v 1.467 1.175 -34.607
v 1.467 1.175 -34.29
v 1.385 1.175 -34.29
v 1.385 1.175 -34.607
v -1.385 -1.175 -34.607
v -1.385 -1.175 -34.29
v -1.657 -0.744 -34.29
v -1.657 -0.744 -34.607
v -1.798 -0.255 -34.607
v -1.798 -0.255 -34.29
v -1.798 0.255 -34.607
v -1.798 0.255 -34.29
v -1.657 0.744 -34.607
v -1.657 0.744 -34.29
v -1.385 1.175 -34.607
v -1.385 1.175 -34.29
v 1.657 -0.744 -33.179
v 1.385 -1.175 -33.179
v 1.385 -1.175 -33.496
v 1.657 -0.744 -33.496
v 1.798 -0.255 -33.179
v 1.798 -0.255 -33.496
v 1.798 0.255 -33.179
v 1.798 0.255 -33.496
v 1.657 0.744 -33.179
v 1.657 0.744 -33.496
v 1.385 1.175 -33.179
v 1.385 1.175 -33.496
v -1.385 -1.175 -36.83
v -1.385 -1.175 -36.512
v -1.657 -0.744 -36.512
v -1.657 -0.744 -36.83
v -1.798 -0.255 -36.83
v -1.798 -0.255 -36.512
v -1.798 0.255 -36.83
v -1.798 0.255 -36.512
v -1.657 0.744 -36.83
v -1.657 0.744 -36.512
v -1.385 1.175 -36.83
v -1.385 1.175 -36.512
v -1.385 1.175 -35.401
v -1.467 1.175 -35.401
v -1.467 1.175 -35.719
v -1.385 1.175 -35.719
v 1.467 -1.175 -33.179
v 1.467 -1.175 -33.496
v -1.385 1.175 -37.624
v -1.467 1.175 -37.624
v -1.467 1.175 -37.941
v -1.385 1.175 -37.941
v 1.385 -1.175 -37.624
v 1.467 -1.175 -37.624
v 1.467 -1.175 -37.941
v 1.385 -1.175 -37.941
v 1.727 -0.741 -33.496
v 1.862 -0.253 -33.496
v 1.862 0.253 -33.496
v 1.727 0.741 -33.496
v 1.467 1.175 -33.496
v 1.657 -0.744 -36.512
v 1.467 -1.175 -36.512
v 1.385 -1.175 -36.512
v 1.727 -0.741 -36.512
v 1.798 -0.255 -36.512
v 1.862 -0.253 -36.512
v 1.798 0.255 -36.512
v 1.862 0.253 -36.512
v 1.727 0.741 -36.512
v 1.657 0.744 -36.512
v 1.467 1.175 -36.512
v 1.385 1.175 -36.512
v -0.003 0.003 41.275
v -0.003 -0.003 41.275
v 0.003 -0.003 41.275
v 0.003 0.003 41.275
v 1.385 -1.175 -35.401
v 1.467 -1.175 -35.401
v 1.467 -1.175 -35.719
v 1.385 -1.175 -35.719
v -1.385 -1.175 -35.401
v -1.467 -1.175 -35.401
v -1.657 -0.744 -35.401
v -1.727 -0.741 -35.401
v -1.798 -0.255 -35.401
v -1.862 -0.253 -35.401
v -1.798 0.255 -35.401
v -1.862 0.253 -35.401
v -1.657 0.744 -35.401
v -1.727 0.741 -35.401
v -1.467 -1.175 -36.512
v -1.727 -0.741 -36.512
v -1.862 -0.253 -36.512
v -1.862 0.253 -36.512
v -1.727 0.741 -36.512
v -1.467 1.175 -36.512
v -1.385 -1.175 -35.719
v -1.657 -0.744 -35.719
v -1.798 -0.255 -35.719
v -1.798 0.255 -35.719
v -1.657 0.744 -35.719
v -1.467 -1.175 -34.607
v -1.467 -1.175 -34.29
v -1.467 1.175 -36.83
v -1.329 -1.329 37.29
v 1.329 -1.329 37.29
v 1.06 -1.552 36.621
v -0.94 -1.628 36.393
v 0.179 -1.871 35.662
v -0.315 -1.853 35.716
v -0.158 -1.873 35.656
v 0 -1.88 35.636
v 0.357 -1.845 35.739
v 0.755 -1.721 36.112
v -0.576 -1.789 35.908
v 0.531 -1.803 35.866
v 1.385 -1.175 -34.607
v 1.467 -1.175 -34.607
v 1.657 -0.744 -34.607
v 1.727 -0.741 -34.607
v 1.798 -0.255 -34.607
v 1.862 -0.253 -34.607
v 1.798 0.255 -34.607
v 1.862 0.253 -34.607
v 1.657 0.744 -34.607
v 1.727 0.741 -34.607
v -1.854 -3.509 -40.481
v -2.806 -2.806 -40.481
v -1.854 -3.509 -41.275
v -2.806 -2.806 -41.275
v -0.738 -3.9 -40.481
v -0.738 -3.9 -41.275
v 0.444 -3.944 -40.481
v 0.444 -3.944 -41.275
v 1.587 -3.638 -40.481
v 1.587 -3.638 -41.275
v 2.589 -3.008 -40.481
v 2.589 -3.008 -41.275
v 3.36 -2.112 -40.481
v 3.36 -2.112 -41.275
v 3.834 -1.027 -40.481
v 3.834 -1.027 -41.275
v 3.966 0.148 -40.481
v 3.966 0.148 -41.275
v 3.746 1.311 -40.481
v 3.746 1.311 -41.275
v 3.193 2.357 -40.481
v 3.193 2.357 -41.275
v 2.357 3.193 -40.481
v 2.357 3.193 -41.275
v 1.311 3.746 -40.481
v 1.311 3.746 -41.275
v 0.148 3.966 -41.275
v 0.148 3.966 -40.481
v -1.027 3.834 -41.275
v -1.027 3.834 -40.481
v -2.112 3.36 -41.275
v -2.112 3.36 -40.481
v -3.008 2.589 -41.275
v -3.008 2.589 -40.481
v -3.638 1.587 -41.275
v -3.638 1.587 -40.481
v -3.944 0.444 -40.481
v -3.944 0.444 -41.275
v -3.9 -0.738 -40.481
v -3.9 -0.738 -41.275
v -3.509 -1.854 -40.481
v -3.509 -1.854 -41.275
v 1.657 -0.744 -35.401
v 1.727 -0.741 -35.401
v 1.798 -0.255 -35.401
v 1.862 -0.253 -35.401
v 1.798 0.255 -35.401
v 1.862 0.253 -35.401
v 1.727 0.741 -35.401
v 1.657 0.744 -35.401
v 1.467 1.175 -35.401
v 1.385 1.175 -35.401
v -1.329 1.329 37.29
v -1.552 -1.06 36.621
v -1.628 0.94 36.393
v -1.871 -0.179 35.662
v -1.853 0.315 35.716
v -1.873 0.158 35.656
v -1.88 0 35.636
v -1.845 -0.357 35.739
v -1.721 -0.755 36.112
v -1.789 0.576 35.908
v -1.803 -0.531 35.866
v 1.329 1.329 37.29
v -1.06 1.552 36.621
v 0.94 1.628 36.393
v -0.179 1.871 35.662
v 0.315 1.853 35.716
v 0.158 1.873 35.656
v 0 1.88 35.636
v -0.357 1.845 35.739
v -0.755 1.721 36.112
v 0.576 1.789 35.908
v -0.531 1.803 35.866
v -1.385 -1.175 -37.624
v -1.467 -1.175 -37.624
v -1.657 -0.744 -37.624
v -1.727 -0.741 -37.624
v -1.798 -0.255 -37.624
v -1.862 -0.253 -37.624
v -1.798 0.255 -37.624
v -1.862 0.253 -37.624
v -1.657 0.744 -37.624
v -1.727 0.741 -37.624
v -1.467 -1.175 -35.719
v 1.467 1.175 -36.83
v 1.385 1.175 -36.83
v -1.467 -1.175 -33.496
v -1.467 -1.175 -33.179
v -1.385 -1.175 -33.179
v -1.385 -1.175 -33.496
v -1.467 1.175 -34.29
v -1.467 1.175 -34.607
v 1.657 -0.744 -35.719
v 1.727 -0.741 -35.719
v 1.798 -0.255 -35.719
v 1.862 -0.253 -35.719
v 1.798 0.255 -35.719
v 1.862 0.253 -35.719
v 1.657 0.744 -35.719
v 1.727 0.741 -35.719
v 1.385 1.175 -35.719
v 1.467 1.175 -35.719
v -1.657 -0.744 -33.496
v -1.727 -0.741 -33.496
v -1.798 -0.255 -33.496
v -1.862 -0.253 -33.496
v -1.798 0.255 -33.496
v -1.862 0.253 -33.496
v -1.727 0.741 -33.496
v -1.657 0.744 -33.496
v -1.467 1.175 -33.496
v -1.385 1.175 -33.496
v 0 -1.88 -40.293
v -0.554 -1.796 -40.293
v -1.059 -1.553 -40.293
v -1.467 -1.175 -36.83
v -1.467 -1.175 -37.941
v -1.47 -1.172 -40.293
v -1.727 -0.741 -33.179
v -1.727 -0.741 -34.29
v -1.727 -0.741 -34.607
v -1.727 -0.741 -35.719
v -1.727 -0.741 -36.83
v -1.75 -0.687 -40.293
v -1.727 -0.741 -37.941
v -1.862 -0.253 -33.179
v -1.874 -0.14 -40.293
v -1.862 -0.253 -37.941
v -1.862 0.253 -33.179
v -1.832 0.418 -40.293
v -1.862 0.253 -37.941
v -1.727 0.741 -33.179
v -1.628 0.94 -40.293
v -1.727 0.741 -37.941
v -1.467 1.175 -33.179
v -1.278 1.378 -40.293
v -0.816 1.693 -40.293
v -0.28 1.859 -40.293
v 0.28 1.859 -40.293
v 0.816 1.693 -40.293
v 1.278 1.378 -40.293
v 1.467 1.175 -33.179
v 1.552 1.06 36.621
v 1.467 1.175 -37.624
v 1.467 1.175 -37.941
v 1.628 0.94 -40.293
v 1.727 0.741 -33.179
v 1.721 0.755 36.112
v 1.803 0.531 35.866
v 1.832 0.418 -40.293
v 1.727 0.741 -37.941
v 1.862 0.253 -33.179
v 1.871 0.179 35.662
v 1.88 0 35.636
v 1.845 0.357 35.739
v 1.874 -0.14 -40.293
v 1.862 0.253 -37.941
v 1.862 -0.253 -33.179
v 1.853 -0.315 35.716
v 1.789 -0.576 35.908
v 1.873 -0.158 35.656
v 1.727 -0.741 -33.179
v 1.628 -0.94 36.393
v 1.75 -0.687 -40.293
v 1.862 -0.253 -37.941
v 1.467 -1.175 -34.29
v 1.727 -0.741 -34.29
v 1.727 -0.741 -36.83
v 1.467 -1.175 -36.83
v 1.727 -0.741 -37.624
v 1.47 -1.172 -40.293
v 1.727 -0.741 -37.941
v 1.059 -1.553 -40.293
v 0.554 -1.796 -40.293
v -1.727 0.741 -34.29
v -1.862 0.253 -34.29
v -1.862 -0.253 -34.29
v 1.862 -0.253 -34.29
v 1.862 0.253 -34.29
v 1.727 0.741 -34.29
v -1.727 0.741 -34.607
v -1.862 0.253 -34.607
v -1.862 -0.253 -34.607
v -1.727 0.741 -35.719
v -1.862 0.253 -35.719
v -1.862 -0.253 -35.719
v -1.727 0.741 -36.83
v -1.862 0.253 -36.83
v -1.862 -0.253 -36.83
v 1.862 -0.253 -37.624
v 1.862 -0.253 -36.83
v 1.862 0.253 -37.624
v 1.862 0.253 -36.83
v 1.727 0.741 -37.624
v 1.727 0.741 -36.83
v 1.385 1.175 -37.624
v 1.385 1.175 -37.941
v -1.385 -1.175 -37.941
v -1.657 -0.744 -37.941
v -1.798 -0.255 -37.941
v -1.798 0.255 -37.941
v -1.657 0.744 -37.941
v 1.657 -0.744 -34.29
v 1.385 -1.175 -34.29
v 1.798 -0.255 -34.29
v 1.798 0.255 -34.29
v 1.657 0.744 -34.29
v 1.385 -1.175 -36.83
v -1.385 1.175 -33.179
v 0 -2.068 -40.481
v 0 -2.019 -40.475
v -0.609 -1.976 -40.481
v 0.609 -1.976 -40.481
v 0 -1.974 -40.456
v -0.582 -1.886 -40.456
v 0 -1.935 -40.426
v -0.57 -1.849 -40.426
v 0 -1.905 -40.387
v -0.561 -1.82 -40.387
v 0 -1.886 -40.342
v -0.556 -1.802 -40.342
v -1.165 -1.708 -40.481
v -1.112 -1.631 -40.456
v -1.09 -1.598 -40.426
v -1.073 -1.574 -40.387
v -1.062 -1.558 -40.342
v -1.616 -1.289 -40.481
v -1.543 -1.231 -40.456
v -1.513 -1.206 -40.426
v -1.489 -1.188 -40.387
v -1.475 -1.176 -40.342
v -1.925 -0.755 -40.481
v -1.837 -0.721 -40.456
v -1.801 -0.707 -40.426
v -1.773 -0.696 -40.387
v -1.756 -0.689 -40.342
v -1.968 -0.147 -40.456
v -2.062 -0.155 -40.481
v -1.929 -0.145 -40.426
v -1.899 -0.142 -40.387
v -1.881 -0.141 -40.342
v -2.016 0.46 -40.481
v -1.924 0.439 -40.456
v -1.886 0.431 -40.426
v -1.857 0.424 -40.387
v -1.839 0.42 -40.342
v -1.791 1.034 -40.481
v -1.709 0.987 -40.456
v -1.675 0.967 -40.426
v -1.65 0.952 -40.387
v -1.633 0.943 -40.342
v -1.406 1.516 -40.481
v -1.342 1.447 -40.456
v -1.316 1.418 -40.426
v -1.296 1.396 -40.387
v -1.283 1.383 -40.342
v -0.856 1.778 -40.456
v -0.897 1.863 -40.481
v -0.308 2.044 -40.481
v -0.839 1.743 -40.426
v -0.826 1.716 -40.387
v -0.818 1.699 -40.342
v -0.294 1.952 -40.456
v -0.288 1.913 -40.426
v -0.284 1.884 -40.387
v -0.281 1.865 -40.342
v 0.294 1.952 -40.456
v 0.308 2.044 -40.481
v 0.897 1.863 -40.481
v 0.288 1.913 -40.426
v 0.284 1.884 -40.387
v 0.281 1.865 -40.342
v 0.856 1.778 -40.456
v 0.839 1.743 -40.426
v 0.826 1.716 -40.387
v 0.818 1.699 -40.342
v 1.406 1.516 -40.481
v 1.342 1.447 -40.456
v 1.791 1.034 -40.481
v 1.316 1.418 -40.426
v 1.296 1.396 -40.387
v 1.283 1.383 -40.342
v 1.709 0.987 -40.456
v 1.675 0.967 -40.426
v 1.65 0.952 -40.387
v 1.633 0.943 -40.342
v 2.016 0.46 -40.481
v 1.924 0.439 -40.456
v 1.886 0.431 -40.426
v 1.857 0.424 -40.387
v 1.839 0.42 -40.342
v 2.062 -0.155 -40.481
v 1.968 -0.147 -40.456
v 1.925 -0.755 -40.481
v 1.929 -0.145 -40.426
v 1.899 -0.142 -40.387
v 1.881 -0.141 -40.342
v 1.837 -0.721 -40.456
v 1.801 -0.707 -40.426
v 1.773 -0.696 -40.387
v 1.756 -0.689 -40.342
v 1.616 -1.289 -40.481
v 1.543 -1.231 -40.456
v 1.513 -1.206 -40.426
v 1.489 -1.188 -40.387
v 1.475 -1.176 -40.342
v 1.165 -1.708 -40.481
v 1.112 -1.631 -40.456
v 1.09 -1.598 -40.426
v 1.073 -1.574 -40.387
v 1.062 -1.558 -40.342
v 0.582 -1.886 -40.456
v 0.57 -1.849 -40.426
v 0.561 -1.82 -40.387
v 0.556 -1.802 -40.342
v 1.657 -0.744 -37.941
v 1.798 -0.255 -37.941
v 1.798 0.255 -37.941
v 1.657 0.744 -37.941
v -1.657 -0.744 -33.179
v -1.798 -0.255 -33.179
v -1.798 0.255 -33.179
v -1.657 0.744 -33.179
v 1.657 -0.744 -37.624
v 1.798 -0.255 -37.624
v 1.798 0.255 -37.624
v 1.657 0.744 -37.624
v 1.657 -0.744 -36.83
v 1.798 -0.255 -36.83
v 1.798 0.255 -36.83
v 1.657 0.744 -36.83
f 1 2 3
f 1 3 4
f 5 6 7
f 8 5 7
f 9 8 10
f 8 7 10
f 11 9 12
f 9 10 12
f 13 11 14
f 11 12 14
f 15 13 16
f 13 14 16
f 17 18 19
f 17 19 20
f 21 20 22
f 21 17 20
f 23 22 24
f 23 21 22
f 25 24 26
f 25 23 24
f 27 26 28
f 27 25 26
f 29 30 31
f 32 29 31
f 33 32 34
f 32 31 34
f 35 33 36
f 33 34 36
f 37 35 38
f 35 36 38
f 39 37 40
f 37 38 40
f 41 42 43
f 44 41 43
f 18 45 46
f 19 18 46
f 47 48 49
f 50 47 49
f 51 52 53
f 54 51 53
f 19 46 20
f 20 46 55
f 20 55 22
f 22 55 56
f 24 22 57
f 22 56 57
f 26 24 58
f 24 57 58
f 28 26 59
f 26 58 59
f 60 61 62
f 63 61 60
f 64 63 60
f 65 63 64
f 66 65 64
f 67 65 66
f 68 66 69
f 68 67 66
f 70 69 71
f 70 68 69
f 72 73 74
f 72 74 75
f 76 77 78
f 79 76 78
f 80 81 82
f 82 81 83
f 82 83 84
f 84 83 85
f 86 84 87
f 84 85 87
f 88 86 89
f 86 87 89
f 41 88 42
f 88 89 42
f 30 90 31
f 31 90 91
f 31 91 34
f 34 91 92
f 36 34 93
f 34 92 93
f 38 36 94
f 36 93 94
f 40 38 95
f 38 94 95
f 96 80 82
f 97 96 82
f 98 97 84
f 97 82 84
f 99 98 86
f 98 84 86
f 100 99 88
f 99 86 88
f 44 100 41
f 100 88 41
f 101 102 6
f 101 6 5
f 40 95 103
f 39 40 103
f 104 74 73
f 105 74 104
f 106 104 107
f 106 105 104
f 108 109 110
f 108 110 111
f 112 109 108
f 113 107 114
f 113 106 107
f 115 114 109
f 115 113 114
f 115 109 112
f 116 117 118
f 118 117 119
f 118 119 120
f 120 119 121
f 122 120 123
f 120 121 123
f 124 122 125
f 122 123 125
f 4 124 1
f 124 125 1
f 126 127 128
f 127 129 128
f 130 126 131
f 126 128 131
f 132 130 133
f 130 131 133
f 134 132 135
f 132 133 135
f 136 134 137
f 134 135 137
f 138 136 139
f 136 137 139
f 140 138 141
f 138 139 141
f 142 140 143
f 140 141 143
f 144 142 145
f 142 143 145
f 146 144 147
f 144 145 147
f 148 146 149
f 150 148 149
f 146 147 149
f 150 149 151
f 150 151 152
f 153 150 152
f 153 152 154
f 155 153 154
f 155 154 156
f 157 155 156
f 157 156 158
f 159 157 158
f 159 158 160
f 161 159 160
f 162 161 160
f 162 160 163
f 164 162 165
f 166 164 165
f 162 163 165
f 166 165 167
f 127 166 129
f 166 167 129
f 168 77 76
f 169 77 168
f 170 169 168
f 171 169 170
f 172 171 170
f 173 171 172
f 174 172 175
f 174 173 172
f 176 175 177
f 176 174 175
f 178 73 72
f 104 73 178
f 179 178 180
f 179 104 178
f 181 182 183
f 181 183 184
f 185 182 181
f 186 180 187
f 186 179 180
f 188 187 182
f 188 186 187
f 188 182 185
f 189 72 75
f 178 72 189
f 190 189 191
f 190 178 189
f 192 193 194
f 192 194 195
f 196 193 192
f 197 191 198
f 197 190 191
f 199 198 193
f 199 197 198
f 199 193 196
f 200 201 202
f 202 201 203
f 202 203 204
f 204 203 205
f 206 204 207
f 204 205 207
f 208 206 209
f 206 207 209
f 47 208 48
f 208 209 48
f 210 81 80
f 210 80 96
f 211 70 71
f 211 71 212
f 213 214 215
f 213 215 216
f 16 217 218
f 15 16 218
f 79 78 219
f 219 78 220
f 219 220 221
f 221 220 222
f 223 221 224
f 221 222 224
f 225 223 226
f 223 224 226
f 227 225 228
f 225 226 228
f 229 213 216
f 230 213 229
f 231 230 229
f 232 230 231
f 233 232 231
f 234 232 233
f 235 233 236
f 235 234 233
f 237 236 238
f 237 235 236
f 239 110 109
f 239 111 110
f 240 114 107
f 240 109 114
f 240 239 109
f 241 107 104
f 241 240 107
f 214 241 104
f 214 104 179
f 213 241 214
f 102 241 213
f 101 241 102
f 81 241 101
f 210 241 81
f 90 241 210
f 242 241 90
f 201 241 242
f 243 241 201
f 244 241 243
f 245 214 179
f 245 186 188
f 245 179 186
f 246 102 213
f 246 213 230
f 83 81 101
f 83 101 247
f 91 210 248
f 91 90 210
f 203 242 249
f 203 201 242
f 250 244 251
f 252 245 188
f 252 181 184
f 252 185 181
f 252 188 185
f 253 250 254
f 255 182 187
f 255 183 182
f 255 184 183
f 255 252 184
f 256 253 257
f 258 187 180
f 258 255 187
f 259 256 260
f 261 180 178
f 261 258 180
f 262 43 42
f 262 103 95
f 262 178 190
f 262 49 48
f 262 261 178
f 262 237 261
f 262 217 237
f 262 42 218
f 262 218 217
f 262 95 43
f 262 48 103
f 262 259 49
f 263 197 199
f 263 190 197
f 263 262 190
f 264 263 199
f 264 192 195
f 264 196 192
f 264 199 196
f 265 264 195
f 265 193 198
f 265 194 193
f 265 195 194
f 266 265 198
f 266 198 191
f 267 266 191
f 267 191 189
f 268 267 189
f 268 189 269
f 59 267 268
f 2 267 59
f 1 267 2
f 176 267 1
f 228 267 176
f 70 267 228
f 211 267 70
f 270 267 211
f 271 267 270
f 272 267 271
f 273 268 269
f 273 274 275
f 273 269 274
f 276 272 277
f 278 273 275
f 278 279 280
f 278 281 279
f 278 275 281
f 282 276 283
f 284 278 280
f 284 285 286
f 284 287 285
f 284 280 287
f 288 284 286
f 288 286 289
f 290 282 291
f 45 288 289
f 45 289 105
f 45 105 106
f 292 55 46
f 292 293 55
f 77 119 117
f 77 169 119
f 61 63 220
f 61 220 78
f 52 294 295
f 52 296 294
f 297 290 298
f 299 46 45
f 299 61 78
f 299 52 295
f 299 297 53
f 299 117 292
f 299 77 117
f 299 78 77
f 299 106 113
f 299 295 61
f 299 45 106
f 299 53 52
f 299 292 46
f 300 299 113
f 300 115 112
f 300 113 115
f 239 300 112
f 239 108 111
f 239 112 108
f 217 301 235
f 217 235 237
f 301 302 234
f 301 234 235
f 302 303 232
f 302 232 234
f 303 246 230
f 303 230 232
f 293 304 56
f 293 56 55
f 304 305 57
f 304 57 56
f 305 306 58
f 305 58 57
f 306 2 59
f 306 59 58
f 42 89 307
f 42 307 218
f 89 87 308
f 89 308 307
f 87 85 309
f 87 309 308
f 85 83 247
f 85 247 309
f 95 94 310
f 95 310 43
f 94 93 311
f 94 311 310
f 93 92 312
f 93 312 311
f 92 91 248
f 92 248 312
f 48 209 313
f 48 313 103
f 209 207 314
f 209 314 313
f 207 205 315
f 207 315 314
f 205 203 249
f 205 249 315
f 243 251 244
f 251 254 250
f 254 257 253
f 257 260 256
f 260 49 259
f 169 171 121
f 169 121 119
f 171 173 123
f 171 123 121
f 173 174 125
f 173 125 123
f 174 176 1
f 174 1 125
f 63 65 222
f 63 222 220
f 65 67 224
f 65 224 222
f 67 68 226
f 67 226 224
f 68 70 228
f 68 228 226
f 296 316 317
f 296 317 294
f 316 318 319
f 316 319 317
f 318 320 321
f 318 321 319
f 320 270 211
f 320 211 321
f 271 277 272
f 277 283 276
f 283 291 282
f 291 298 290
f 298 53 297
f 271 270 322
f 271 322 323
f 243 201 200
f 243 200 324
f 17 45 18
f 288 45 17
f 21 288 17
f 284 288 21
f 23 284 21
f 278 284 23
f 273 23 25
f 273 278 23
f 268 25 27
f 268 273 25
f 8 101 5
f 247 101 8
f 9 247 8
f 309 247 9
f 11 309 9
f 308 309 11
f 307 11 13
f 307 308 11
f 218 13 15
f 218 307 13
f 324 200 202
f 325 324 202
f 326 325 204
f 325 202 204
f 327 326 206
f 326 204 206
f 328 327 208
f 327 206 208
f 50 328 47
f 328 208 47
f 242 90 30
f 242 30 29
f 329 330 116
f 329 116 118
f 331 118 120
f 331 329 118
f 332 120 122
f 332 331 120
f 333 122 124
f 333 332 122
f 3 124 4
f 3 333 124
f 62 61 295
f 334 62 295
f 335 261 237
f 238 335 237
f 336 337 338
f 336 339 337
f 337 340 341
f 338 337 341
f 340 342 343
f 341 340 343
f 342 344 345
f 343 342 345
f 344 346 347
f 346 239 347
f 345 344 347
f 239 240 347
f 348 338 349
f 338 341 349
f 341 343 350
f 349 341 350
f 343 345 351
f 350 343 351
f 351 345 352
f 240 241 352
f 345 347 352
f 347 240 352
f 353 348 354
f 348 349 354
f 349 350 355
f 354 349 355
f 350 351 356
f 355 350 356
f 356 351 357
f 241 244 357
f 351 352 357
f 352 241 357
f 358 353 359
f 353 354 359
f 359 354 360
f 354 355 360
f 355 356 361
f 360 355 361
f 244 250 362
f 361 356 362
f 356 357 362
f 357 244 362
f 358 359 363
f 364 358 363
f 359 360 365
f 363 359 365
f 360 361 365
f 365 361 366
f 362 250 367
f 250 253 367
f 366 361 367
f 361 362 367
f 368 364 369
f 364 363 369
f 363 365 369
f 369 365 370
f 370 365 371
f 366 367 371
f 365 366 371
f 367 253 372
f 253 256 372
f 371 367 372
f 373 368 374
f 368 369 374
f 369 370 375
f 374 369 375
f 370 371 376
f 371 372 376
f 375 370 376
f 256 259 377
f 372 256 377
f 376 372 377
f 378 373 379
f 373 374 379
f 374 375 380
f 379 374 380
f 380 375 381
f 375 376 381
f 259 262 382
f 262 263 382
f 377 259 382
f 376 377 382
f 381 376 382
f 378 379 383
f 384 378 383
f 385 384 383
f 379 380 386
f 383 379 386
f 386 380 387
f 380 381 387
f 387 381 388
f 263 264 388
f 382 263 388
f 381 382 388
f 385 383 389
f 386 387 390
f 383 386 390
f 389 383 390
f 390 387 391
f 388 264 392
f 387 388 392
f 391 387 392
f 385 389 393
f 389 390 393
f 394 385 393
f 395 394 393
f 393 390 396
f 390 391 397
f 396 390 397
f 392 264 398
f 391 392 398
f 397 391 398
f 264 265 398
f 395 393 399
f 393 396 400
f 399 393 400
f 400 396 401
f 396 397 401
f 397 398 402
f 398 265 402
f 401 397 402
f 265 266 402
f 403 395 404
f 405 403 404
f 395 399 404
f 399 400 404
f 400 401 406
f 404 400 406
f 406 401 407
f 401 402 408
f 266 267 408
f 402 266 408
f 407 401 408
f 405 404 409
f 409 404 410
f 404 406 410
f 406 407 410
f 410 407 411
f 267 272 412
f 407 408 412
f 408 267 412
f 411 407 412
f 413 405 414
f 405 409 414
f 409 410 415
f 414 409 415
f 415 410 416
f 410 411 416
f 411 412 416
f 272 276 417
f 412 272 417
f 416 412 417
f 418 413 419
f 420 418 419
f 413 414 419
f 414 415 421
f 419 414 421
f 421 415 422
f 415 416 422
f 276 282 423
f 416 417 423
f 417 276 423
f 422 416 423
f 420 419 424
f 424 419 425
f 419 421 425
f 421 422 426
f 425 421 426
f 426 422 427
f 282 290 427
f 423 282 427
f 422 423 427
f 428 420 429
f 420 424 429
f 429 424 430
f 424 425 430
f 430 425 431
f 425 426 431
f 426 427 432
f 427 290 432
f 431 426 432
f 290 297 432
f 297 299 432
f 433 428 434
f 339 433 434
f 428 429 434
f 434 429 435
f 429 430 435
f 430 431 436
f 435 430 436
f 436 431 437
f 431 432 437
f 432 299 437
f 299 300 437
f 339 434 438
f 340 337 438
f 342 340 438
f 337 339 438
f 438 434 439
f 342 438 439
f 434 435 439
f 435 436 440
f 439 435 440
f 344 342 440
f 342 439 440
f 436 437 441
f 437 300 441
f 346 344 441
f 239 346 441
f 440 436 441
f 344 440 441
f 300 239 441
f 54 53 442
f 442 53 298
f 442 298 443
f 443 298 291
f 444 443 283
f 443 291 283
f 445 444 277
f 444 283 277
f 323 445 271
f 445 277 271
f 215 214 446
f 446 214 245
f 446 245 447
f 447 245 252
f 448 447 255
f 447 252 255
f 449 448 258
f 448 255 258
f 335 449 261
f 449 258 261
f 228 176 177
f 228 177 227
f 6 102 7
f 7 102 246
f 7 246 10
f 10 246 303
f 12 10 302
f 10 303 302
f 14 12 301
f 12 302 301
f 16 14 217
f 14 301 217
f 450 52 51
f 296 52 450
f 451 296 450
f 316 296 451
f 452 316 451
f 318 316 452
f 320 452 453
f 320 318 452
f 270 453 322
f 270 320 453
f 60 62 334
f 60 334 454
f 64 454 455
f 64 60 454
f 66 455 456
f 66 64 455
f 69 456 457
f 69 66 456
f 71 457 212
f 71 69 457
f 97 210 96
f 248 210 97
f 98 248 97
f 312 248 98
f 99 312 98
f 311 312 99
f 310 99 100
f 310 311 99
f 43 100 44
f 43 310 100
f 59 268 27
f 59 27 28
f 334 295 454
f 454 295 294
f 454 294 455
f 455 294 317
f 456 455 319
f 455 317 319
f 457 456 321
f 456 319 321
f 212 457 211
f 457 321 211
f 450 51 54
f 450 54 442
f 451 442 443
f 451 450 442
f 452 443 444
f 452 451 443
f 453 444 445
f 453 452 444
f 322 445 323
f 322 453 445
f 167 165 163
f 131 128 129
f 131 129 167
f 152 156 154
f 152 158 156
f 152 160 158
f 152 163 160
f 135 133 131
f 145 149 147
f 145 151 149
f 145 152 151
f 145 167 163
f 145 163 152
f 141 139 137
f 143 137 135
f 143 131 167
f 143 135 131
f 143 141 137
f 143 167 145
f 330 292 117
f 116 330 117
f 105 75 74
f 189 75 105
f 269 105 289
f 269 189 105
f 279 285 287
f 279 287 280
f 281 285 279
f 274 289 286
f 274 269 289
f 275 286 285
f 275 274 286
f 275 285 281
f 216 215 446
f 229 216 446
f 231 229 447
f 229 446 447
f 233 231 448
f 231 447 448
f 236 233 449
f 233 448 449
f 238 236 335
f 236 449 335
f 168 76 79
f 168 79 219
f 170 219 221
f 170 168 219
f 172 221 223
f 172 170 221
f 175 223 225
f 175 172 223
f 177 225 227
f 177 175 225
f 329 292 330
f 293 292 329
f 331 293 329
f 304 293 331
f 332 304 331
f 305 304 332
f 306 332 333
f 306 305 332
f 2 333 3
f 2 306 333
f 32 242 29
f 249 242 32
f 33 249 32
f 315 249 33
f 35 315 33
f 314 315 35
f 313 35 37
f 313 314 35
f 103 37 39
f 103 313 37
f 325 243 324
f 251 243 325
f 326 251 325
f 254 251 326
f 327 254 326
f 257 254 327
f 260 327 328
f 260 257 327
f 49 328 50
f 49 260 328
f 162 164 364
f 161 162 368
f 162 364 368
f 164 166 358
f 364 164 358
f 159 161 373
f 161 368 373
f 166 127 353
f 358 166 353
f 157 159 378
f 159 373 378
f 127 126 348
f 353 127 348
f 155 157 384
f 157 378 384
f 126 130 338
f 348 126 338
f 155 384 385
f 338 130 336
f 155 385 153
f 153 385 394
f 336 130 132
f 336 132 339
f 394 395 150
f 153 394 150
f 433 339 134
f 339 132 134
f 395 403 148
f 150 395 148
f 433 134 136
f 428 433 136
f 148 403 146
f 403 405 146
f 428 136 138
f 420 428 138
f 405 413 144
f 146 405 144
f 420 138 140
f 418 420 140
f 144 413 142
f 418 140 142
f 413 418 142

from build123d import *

# Parameters (mm, degrees)
CUT_EXTRUDE1_DEPTH      = 42.360505525
CIRPATTERN1_COUNT       = 4
SKETCH5_W               = 0.79375
SKETCH5_H               = 3.96875
FILLET1_R               = 0.18796
CUT_EXTRUDE3_REACH      = 43.876
CUT_EXTRUDE3_END_RADIUS = 1.8161
SKETCH6_W               = 0.3175
SKETCH6_H               = 2.3495


with BuildPart() as part:
    # Sketch2 → Revolve1 (revolve)
    with BuildSketch(Plane(origin=(0, 0, 0), x_dir=(0, 0, -1), z_dir=(1, 0, 0))):
        Polygon((-35.6362, -1.8796), (41.275, -1.8796), (41.275, 0), (-41.275, 0), (-41.275, -1.8796), align=None)
    revolve(axis=Axis((0, 0, 41.275), (0, 0, -1)))

    # Sketch3 → Cut-Extrude1 (cut, symmetric)
    with BuildSketch(Plane(origin=(0, 0, 0), x_dir=(0, 0, -1), z_dir=(1, 0, 0))):
        Polygon((-41.275, -0.00254), (-35.6362, -1.8796), (-41.275, -1.8796), align=None)
    cut_extrude1 = extrude(amount=CUT_EXTRUDE1_DEPTH, both=True, mode=Mode.SUBTRACT)

    # CirPattern1: Cut-Extrude1 ×4 about axis
    cirpattern1_axis = Axis((0, 0, 0), (0, 0, 1))
    for i in range(1, CIRPATTERN1_COUNT):
        add(cut_extrude1.rotate(cirpattern1_axis, i * 360 / CIRPATTERN1_COUNT), mode=Mode.SUBTRACT)

    # Sketch5 → Revolve2 (revolve)
    with BuildSketch(Plane(origin=(0, 0, 0), x_dir=(0, 0, -1), z_dir=(1, 0, 0)), mode=Mode.PRIVATE) as revolve2_sk:
        with Locations((40.878125, 1.984375)):
            Rectangle(SKETCH5_W, SKETCH5_H)
    revolve(revolve2_sk.sketch.rotate(Axis((0, 0, -41.275), (0, 0, 1)), 135), axis=Axis((0, 0, -41.275), (0, 0, 1)))

    # Fillet1
    fillet1_edges = [part.edges().sort_by_distance(p)[0] for p in [
        (0, 1.8796, -40.48125),
    ]]
    fillet(fillet1_edges, radius=FILLET1_R)

    # Cut-Extrude3: up to this cylinder (the profile starts outside it)
    cut_extrude3_end = Plane(origin=(0, 0, -35.56), z_dir=(0, 0, 1)) * Cylinder(CUT_EXTRUDE3_END_RADIUS, 96.8292, mode=Mode.PRIVATE)
    # Sketch6 → Cut-Extrude3 (cut, up to the surface)
    with BuildSketch(Plane(origin=(1.8796, 0, 0), x_dir=(0, 0, -1), z_dir=(1, 0, 0)), mode=Mode.PRIVATE) as cut_extrude3_sk1:
        with Locations((33.3375, 0)):
            Rectangle(SKETCH6_W, SKETCH6_H)
    cut_extrude3_tool1 = extrude(cut_extrude3_sk1.sketch, amount=-CUT_EXTRUDE3_REACH, mode=Mode.PRIVATE) - cut_extrude3_end
    # Sketch6 → Cut-Extrude3 (cut, up to the surface)
    with BuildSketch(Plane(origin=(1.8796, 0, 0), x_dir=(0, 0, -1), z_dir=(1, 0, 0)), mode=Mode.PRIVATE) as cut_extrude3_sk2:
        with Locations((34.44875, 0)):
            Rectangle(SKETCH6_W, SKETCH6_H)
    cut_extrude3_tool2 = extrude(cut_extrude3_sk2.sketch, amount=-CUT_EXTRUDE3_REACH, mode=Mode.PRIVATE) - cut_extrude3_end
    # Sketch6 → Cut-Extrude3 (cut, up to the surface)
    with BuildSketch(Plane(origin=(1.8796, 0, 0), x_dir=(0, 0, -1), z_dir=(1, 0, 0)), mode=Mode.PRIVATE) as cut_extrude3_sk3:
        with Locations((35.56, 0)):
            Rectangle(SKETCH6_W, SKETCH6_H)
    cut_extrude3_tool3 = extrude(cut_extrude3_sk3.sketch, amount=-CUT_EXTRUDE3_REACH, mode=Mode.PRIVATE) - cut_extrude3_end
    # Sketch6 → Cut-Extrude3 (cut, up to the surface)
    with BuildSketch(Plane(origin=(1.8796, 0, 0), x_dir=(0, 0, -1), z_dir=(1, 0, 0)), mode=Mode.PRIVATE) as cut_extrude3_sk4:
        with Locations((36.67125, 0)):
            Rectangle(SKETCH6_W, SKETCH6_H)
    cut_extrude3_tool4 = extrude(cut_extrude3_sk4.sketch, amount=-CUT_EXTRUDE3_REACH, mode=Mode.PRIVATE) - cut_extrude3_end
    # Sketch6 → Cut-Extrude3 (cut, up to the surface)
    with BuildSketch(Plane(origin=(1.8796, 0, 0), x_dir=(0, 0, -1), z_dir=(1, 0, 0)), mode=Mode.PRIVATE) as cut_extrude3_sk5:
        with Locations((37.7825, 0)):
            Rectangle(SKETCH6_W, SKETCH6_H)
    cut_extrude3_tool5 = extrude(cut_extrude3_sk5.sketch, amount=-CUT_EXTRUDE3_REACH, mode=Mode.PRIVATE) - cut_extrude3_end
    cut_extrude3 = cut_extrude3_tool1.solids().sort_by_distance((1.8796, 0, -33.3375))[0] + cut_extrude3_tool2.solids().sort_by_distance((1.8796, 0, -34.44875))[0] + cut_extrude3_tool3.solids().sort_by_distance((1.8796, 0, -35.56))[0] + cut_extrude3_tool4.solids().sort_by_distance((1.8796, 0, -36.67125))[0] + cut_extrude3_tool5.solids().sort_by_distance((1.8796, 0, -37.7825))[0]
    add(cut_extrude3, mode=Mode.SUBTRACT)

    # Mirror1: Cut-Extrude3 across plane
    add(cut_extrude3.mirror(Plane(origin=(0, 0, 0), x_dir=(0, 0, 1), z_dir=(1, 0, 0))), mode=Mode.SUBTRACT)


solid = part.part
